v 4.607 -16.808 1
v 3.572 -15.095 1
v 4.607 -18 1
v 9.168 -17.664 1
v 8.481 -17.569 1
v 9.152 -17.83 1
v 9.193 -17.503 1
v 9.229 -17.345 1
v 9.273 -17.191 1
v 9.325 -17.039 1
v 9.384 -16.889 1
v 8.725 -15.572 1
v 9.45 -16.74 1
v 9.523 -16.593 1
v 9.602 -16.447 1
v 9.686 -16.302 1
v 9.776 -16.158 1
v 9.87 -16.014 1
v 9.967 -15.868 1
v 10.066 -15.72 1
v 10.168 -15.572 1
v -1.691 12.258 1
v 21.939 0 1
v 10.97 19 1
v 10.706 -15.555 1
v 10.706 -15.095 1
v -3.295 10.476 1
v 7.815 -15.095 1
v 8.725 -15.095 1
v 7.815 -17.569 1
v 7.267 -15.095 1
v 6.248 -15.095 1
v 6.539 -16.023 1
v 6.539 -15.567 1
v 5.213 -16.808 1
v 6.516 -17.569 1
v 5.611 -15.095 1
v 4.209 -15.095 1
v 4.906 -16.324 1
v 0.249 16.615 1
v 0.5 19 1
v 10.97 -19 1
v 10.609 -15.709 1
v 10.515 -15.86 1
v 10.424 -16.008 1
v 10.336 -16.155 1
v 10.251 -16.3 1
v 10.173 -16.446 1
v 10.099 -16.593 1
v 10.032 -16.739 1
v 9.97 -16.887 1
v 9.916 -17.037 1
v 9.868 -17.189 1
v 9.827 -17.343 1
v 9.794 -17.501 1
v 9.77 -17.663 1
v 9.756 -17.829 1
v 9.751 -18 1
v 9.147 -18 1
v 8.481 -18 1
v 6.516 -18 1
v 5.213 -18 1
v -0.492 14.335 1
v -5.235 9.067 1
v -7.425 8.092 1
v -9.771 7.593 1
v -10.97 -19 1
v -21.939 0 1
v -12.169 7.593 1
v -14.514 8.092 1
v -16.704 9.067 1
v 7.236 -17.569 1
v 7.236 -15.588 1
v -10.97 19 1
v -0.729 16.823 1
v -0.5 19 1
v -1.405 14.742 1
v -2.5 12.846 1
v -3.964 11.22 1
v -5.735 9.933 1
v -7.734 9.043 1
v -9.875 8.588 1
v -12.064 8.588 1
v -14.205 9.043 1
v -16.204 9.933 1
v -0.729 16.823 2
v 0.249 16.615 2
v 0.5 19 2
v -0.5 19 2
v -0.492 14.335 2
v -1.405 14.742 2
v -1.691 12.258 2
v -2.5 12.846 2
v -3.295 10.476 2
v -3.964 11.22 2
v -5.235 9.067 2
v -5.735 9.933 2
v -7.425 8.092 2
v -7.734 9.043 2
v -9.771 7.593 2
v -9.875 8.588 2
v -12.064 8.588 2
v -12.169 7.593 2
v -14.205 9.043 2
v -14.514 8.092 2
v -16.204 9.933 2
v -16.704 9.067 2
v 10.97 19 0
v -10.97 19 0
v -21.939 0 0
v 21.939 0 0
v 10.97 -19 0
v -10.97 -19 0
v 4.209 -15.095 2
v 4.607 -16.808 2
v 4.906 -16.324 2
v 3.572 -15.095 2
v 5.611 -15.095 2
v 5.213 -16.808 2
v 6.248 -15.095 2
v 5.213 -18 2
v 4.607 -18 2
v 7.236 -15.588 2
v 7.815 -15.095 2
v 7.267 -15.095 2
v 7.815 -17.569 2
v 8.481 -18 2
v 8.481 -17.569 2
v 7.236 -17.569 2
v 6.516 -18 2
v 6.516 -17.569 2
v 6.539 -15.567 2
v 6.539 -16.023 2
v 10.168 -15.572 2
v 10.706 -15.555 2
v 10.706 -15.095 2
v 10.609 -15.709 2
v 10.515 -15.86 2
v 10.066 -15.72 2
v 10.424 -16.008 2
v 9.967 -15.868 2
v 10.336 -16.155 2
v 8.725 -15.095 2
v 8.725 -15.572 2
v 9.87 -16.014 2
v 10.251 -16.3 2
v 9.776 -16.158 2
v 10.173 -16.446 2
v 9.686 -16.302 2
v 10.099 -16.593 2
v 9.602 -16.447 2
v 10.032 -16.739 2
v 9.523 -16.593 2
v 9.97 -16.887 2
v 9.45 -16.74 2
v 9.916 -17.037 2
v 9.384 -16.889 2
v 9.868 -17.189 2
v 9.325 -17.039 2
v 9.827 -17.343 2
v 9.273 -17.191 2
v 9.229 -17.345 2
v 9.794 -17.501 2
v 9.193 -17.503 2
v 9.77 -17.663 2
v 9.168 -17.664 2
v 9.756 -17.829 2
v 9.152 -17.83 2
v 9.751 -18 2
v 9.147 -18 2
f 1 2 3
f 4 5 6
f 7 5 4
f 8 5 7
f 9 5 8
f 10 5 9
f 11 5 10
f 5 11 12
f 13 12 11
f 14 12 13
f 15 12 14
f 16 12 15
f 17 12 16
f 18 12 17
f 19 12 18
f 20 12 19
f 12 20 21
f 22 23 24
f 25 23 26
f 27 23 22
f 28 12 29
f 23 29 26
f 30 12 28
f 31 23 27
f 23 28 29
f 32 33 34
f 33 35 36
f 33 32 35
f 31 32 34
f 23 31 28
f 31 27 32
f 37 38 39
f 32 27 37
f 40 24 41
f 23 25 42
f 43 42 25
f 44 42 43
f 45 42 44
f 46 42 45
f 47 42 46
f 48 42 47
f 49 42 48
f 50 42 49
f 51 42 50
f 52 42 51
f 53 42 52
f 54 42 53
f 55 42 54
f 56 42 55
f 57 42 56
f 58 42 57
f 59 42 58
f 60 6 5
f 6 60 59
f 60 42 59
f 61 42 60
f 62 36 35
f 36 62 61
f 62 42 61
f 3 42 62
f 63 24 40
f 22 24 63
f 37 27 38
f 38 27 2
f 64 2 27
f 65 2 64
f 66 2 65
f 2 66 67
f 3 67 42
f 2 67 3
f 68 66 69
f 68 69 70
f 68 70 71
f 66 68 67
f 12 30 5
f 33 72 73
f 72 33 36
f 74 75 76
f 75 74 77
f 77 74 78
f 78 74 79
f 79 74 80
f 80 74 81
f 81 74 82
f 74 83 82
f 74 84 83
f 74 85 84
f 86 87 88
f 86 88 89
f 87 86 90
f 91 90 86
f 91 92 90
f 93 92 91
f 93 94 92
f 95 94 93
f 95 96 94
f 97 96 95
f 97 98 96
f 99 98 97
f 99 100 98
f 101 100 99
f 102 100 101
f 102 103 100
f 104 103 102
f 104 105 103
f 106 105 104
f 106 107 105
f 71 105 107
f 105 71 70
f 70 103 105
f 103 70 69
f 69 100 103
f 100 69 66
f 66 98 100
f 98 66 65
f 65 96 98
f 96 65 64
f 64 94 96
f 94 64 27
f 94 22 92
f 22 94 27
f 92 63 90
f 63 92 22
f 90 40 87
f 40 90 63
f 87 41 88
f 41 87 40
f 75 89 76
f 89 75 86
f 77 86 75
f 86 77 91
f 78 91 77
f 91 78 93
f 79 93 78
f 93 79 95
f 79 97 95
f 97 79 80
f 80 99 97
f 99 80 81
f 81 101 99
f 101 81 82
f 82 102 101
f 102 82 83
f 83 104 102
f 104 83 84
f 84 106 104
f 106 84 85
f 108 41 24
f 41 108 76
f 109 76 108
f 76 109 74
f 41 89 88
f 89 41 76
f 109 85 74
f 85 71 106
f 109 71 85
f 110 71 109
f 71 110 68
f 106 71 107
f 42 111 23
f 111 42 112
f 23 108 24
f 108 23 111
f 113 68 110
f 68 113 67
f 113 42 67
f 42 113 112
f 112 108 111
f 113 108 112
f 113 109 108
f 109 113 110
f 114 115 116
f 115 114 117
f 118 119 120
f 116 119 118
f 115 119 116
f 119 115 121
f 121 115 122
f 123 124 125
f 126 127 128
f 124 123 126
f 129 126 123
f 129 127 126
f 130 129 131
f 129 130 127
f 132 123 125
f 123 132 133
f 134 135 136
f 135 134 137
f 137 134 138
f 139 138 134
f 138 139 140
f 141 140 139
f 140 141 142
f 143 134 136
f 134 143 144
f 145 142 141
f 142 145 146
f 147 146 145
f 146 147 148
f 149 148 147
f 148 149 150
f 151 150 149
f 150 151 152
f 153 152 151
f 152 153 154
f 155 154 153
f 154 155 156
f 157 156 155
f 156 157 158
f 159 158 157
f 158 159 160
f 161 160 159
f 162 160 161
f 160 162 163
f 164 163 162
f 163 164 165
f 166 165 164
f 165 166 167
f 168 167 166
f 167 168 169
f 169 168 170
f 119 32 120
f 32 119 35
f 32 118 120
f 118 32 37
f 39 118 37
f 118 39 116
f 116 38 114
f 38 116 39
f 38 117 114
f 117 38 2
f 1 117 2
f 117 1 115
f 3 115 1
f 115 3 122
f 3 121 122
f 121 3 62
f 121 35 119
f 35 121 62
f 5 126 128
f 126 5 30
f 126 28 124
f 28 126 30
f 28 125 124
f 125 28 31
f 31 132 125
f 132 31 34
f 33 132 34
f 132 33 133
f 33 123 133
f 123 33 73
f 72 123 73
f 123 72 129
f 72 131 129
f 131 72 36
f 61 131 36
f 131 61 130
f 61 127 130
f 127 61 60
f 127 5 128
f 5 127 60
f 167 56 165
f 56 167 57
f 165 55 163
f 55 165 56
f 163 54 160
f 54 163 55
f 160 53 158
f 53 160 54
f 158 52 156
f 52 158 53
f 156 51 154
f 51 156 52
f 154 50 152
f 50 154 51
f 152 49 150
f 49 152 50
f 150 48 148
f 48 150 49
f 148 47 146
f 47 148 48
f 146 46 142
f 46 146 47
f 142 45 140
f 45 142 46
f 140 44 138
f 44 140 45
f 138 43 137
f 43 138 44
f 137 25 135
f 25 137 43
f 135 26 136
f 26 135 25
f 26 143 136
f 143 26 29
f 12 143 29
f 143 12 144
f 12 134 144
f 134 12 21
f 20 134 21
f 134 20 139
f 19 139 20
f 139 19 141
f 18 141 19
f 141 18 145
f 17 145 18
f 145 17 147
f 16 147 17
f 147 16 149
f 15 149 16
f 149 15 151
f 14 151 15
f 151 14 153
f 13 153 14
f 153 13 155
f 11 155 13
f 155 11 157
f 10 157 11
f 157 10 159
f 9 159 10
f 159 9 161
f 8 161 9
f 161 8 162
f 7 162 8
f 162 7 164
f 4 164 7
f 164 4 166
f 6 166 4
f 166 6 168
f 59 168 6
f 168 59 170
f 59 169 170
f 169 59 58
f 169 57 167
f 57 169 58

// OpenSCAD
include <../../Scripts/18xx tiles basic functions.scad>
hex("blue");
put_tilenr("Y17");

sharp_curve(3);
//put_value_blue("10",30);
//single_city([1,2,4,5],"GWR");
